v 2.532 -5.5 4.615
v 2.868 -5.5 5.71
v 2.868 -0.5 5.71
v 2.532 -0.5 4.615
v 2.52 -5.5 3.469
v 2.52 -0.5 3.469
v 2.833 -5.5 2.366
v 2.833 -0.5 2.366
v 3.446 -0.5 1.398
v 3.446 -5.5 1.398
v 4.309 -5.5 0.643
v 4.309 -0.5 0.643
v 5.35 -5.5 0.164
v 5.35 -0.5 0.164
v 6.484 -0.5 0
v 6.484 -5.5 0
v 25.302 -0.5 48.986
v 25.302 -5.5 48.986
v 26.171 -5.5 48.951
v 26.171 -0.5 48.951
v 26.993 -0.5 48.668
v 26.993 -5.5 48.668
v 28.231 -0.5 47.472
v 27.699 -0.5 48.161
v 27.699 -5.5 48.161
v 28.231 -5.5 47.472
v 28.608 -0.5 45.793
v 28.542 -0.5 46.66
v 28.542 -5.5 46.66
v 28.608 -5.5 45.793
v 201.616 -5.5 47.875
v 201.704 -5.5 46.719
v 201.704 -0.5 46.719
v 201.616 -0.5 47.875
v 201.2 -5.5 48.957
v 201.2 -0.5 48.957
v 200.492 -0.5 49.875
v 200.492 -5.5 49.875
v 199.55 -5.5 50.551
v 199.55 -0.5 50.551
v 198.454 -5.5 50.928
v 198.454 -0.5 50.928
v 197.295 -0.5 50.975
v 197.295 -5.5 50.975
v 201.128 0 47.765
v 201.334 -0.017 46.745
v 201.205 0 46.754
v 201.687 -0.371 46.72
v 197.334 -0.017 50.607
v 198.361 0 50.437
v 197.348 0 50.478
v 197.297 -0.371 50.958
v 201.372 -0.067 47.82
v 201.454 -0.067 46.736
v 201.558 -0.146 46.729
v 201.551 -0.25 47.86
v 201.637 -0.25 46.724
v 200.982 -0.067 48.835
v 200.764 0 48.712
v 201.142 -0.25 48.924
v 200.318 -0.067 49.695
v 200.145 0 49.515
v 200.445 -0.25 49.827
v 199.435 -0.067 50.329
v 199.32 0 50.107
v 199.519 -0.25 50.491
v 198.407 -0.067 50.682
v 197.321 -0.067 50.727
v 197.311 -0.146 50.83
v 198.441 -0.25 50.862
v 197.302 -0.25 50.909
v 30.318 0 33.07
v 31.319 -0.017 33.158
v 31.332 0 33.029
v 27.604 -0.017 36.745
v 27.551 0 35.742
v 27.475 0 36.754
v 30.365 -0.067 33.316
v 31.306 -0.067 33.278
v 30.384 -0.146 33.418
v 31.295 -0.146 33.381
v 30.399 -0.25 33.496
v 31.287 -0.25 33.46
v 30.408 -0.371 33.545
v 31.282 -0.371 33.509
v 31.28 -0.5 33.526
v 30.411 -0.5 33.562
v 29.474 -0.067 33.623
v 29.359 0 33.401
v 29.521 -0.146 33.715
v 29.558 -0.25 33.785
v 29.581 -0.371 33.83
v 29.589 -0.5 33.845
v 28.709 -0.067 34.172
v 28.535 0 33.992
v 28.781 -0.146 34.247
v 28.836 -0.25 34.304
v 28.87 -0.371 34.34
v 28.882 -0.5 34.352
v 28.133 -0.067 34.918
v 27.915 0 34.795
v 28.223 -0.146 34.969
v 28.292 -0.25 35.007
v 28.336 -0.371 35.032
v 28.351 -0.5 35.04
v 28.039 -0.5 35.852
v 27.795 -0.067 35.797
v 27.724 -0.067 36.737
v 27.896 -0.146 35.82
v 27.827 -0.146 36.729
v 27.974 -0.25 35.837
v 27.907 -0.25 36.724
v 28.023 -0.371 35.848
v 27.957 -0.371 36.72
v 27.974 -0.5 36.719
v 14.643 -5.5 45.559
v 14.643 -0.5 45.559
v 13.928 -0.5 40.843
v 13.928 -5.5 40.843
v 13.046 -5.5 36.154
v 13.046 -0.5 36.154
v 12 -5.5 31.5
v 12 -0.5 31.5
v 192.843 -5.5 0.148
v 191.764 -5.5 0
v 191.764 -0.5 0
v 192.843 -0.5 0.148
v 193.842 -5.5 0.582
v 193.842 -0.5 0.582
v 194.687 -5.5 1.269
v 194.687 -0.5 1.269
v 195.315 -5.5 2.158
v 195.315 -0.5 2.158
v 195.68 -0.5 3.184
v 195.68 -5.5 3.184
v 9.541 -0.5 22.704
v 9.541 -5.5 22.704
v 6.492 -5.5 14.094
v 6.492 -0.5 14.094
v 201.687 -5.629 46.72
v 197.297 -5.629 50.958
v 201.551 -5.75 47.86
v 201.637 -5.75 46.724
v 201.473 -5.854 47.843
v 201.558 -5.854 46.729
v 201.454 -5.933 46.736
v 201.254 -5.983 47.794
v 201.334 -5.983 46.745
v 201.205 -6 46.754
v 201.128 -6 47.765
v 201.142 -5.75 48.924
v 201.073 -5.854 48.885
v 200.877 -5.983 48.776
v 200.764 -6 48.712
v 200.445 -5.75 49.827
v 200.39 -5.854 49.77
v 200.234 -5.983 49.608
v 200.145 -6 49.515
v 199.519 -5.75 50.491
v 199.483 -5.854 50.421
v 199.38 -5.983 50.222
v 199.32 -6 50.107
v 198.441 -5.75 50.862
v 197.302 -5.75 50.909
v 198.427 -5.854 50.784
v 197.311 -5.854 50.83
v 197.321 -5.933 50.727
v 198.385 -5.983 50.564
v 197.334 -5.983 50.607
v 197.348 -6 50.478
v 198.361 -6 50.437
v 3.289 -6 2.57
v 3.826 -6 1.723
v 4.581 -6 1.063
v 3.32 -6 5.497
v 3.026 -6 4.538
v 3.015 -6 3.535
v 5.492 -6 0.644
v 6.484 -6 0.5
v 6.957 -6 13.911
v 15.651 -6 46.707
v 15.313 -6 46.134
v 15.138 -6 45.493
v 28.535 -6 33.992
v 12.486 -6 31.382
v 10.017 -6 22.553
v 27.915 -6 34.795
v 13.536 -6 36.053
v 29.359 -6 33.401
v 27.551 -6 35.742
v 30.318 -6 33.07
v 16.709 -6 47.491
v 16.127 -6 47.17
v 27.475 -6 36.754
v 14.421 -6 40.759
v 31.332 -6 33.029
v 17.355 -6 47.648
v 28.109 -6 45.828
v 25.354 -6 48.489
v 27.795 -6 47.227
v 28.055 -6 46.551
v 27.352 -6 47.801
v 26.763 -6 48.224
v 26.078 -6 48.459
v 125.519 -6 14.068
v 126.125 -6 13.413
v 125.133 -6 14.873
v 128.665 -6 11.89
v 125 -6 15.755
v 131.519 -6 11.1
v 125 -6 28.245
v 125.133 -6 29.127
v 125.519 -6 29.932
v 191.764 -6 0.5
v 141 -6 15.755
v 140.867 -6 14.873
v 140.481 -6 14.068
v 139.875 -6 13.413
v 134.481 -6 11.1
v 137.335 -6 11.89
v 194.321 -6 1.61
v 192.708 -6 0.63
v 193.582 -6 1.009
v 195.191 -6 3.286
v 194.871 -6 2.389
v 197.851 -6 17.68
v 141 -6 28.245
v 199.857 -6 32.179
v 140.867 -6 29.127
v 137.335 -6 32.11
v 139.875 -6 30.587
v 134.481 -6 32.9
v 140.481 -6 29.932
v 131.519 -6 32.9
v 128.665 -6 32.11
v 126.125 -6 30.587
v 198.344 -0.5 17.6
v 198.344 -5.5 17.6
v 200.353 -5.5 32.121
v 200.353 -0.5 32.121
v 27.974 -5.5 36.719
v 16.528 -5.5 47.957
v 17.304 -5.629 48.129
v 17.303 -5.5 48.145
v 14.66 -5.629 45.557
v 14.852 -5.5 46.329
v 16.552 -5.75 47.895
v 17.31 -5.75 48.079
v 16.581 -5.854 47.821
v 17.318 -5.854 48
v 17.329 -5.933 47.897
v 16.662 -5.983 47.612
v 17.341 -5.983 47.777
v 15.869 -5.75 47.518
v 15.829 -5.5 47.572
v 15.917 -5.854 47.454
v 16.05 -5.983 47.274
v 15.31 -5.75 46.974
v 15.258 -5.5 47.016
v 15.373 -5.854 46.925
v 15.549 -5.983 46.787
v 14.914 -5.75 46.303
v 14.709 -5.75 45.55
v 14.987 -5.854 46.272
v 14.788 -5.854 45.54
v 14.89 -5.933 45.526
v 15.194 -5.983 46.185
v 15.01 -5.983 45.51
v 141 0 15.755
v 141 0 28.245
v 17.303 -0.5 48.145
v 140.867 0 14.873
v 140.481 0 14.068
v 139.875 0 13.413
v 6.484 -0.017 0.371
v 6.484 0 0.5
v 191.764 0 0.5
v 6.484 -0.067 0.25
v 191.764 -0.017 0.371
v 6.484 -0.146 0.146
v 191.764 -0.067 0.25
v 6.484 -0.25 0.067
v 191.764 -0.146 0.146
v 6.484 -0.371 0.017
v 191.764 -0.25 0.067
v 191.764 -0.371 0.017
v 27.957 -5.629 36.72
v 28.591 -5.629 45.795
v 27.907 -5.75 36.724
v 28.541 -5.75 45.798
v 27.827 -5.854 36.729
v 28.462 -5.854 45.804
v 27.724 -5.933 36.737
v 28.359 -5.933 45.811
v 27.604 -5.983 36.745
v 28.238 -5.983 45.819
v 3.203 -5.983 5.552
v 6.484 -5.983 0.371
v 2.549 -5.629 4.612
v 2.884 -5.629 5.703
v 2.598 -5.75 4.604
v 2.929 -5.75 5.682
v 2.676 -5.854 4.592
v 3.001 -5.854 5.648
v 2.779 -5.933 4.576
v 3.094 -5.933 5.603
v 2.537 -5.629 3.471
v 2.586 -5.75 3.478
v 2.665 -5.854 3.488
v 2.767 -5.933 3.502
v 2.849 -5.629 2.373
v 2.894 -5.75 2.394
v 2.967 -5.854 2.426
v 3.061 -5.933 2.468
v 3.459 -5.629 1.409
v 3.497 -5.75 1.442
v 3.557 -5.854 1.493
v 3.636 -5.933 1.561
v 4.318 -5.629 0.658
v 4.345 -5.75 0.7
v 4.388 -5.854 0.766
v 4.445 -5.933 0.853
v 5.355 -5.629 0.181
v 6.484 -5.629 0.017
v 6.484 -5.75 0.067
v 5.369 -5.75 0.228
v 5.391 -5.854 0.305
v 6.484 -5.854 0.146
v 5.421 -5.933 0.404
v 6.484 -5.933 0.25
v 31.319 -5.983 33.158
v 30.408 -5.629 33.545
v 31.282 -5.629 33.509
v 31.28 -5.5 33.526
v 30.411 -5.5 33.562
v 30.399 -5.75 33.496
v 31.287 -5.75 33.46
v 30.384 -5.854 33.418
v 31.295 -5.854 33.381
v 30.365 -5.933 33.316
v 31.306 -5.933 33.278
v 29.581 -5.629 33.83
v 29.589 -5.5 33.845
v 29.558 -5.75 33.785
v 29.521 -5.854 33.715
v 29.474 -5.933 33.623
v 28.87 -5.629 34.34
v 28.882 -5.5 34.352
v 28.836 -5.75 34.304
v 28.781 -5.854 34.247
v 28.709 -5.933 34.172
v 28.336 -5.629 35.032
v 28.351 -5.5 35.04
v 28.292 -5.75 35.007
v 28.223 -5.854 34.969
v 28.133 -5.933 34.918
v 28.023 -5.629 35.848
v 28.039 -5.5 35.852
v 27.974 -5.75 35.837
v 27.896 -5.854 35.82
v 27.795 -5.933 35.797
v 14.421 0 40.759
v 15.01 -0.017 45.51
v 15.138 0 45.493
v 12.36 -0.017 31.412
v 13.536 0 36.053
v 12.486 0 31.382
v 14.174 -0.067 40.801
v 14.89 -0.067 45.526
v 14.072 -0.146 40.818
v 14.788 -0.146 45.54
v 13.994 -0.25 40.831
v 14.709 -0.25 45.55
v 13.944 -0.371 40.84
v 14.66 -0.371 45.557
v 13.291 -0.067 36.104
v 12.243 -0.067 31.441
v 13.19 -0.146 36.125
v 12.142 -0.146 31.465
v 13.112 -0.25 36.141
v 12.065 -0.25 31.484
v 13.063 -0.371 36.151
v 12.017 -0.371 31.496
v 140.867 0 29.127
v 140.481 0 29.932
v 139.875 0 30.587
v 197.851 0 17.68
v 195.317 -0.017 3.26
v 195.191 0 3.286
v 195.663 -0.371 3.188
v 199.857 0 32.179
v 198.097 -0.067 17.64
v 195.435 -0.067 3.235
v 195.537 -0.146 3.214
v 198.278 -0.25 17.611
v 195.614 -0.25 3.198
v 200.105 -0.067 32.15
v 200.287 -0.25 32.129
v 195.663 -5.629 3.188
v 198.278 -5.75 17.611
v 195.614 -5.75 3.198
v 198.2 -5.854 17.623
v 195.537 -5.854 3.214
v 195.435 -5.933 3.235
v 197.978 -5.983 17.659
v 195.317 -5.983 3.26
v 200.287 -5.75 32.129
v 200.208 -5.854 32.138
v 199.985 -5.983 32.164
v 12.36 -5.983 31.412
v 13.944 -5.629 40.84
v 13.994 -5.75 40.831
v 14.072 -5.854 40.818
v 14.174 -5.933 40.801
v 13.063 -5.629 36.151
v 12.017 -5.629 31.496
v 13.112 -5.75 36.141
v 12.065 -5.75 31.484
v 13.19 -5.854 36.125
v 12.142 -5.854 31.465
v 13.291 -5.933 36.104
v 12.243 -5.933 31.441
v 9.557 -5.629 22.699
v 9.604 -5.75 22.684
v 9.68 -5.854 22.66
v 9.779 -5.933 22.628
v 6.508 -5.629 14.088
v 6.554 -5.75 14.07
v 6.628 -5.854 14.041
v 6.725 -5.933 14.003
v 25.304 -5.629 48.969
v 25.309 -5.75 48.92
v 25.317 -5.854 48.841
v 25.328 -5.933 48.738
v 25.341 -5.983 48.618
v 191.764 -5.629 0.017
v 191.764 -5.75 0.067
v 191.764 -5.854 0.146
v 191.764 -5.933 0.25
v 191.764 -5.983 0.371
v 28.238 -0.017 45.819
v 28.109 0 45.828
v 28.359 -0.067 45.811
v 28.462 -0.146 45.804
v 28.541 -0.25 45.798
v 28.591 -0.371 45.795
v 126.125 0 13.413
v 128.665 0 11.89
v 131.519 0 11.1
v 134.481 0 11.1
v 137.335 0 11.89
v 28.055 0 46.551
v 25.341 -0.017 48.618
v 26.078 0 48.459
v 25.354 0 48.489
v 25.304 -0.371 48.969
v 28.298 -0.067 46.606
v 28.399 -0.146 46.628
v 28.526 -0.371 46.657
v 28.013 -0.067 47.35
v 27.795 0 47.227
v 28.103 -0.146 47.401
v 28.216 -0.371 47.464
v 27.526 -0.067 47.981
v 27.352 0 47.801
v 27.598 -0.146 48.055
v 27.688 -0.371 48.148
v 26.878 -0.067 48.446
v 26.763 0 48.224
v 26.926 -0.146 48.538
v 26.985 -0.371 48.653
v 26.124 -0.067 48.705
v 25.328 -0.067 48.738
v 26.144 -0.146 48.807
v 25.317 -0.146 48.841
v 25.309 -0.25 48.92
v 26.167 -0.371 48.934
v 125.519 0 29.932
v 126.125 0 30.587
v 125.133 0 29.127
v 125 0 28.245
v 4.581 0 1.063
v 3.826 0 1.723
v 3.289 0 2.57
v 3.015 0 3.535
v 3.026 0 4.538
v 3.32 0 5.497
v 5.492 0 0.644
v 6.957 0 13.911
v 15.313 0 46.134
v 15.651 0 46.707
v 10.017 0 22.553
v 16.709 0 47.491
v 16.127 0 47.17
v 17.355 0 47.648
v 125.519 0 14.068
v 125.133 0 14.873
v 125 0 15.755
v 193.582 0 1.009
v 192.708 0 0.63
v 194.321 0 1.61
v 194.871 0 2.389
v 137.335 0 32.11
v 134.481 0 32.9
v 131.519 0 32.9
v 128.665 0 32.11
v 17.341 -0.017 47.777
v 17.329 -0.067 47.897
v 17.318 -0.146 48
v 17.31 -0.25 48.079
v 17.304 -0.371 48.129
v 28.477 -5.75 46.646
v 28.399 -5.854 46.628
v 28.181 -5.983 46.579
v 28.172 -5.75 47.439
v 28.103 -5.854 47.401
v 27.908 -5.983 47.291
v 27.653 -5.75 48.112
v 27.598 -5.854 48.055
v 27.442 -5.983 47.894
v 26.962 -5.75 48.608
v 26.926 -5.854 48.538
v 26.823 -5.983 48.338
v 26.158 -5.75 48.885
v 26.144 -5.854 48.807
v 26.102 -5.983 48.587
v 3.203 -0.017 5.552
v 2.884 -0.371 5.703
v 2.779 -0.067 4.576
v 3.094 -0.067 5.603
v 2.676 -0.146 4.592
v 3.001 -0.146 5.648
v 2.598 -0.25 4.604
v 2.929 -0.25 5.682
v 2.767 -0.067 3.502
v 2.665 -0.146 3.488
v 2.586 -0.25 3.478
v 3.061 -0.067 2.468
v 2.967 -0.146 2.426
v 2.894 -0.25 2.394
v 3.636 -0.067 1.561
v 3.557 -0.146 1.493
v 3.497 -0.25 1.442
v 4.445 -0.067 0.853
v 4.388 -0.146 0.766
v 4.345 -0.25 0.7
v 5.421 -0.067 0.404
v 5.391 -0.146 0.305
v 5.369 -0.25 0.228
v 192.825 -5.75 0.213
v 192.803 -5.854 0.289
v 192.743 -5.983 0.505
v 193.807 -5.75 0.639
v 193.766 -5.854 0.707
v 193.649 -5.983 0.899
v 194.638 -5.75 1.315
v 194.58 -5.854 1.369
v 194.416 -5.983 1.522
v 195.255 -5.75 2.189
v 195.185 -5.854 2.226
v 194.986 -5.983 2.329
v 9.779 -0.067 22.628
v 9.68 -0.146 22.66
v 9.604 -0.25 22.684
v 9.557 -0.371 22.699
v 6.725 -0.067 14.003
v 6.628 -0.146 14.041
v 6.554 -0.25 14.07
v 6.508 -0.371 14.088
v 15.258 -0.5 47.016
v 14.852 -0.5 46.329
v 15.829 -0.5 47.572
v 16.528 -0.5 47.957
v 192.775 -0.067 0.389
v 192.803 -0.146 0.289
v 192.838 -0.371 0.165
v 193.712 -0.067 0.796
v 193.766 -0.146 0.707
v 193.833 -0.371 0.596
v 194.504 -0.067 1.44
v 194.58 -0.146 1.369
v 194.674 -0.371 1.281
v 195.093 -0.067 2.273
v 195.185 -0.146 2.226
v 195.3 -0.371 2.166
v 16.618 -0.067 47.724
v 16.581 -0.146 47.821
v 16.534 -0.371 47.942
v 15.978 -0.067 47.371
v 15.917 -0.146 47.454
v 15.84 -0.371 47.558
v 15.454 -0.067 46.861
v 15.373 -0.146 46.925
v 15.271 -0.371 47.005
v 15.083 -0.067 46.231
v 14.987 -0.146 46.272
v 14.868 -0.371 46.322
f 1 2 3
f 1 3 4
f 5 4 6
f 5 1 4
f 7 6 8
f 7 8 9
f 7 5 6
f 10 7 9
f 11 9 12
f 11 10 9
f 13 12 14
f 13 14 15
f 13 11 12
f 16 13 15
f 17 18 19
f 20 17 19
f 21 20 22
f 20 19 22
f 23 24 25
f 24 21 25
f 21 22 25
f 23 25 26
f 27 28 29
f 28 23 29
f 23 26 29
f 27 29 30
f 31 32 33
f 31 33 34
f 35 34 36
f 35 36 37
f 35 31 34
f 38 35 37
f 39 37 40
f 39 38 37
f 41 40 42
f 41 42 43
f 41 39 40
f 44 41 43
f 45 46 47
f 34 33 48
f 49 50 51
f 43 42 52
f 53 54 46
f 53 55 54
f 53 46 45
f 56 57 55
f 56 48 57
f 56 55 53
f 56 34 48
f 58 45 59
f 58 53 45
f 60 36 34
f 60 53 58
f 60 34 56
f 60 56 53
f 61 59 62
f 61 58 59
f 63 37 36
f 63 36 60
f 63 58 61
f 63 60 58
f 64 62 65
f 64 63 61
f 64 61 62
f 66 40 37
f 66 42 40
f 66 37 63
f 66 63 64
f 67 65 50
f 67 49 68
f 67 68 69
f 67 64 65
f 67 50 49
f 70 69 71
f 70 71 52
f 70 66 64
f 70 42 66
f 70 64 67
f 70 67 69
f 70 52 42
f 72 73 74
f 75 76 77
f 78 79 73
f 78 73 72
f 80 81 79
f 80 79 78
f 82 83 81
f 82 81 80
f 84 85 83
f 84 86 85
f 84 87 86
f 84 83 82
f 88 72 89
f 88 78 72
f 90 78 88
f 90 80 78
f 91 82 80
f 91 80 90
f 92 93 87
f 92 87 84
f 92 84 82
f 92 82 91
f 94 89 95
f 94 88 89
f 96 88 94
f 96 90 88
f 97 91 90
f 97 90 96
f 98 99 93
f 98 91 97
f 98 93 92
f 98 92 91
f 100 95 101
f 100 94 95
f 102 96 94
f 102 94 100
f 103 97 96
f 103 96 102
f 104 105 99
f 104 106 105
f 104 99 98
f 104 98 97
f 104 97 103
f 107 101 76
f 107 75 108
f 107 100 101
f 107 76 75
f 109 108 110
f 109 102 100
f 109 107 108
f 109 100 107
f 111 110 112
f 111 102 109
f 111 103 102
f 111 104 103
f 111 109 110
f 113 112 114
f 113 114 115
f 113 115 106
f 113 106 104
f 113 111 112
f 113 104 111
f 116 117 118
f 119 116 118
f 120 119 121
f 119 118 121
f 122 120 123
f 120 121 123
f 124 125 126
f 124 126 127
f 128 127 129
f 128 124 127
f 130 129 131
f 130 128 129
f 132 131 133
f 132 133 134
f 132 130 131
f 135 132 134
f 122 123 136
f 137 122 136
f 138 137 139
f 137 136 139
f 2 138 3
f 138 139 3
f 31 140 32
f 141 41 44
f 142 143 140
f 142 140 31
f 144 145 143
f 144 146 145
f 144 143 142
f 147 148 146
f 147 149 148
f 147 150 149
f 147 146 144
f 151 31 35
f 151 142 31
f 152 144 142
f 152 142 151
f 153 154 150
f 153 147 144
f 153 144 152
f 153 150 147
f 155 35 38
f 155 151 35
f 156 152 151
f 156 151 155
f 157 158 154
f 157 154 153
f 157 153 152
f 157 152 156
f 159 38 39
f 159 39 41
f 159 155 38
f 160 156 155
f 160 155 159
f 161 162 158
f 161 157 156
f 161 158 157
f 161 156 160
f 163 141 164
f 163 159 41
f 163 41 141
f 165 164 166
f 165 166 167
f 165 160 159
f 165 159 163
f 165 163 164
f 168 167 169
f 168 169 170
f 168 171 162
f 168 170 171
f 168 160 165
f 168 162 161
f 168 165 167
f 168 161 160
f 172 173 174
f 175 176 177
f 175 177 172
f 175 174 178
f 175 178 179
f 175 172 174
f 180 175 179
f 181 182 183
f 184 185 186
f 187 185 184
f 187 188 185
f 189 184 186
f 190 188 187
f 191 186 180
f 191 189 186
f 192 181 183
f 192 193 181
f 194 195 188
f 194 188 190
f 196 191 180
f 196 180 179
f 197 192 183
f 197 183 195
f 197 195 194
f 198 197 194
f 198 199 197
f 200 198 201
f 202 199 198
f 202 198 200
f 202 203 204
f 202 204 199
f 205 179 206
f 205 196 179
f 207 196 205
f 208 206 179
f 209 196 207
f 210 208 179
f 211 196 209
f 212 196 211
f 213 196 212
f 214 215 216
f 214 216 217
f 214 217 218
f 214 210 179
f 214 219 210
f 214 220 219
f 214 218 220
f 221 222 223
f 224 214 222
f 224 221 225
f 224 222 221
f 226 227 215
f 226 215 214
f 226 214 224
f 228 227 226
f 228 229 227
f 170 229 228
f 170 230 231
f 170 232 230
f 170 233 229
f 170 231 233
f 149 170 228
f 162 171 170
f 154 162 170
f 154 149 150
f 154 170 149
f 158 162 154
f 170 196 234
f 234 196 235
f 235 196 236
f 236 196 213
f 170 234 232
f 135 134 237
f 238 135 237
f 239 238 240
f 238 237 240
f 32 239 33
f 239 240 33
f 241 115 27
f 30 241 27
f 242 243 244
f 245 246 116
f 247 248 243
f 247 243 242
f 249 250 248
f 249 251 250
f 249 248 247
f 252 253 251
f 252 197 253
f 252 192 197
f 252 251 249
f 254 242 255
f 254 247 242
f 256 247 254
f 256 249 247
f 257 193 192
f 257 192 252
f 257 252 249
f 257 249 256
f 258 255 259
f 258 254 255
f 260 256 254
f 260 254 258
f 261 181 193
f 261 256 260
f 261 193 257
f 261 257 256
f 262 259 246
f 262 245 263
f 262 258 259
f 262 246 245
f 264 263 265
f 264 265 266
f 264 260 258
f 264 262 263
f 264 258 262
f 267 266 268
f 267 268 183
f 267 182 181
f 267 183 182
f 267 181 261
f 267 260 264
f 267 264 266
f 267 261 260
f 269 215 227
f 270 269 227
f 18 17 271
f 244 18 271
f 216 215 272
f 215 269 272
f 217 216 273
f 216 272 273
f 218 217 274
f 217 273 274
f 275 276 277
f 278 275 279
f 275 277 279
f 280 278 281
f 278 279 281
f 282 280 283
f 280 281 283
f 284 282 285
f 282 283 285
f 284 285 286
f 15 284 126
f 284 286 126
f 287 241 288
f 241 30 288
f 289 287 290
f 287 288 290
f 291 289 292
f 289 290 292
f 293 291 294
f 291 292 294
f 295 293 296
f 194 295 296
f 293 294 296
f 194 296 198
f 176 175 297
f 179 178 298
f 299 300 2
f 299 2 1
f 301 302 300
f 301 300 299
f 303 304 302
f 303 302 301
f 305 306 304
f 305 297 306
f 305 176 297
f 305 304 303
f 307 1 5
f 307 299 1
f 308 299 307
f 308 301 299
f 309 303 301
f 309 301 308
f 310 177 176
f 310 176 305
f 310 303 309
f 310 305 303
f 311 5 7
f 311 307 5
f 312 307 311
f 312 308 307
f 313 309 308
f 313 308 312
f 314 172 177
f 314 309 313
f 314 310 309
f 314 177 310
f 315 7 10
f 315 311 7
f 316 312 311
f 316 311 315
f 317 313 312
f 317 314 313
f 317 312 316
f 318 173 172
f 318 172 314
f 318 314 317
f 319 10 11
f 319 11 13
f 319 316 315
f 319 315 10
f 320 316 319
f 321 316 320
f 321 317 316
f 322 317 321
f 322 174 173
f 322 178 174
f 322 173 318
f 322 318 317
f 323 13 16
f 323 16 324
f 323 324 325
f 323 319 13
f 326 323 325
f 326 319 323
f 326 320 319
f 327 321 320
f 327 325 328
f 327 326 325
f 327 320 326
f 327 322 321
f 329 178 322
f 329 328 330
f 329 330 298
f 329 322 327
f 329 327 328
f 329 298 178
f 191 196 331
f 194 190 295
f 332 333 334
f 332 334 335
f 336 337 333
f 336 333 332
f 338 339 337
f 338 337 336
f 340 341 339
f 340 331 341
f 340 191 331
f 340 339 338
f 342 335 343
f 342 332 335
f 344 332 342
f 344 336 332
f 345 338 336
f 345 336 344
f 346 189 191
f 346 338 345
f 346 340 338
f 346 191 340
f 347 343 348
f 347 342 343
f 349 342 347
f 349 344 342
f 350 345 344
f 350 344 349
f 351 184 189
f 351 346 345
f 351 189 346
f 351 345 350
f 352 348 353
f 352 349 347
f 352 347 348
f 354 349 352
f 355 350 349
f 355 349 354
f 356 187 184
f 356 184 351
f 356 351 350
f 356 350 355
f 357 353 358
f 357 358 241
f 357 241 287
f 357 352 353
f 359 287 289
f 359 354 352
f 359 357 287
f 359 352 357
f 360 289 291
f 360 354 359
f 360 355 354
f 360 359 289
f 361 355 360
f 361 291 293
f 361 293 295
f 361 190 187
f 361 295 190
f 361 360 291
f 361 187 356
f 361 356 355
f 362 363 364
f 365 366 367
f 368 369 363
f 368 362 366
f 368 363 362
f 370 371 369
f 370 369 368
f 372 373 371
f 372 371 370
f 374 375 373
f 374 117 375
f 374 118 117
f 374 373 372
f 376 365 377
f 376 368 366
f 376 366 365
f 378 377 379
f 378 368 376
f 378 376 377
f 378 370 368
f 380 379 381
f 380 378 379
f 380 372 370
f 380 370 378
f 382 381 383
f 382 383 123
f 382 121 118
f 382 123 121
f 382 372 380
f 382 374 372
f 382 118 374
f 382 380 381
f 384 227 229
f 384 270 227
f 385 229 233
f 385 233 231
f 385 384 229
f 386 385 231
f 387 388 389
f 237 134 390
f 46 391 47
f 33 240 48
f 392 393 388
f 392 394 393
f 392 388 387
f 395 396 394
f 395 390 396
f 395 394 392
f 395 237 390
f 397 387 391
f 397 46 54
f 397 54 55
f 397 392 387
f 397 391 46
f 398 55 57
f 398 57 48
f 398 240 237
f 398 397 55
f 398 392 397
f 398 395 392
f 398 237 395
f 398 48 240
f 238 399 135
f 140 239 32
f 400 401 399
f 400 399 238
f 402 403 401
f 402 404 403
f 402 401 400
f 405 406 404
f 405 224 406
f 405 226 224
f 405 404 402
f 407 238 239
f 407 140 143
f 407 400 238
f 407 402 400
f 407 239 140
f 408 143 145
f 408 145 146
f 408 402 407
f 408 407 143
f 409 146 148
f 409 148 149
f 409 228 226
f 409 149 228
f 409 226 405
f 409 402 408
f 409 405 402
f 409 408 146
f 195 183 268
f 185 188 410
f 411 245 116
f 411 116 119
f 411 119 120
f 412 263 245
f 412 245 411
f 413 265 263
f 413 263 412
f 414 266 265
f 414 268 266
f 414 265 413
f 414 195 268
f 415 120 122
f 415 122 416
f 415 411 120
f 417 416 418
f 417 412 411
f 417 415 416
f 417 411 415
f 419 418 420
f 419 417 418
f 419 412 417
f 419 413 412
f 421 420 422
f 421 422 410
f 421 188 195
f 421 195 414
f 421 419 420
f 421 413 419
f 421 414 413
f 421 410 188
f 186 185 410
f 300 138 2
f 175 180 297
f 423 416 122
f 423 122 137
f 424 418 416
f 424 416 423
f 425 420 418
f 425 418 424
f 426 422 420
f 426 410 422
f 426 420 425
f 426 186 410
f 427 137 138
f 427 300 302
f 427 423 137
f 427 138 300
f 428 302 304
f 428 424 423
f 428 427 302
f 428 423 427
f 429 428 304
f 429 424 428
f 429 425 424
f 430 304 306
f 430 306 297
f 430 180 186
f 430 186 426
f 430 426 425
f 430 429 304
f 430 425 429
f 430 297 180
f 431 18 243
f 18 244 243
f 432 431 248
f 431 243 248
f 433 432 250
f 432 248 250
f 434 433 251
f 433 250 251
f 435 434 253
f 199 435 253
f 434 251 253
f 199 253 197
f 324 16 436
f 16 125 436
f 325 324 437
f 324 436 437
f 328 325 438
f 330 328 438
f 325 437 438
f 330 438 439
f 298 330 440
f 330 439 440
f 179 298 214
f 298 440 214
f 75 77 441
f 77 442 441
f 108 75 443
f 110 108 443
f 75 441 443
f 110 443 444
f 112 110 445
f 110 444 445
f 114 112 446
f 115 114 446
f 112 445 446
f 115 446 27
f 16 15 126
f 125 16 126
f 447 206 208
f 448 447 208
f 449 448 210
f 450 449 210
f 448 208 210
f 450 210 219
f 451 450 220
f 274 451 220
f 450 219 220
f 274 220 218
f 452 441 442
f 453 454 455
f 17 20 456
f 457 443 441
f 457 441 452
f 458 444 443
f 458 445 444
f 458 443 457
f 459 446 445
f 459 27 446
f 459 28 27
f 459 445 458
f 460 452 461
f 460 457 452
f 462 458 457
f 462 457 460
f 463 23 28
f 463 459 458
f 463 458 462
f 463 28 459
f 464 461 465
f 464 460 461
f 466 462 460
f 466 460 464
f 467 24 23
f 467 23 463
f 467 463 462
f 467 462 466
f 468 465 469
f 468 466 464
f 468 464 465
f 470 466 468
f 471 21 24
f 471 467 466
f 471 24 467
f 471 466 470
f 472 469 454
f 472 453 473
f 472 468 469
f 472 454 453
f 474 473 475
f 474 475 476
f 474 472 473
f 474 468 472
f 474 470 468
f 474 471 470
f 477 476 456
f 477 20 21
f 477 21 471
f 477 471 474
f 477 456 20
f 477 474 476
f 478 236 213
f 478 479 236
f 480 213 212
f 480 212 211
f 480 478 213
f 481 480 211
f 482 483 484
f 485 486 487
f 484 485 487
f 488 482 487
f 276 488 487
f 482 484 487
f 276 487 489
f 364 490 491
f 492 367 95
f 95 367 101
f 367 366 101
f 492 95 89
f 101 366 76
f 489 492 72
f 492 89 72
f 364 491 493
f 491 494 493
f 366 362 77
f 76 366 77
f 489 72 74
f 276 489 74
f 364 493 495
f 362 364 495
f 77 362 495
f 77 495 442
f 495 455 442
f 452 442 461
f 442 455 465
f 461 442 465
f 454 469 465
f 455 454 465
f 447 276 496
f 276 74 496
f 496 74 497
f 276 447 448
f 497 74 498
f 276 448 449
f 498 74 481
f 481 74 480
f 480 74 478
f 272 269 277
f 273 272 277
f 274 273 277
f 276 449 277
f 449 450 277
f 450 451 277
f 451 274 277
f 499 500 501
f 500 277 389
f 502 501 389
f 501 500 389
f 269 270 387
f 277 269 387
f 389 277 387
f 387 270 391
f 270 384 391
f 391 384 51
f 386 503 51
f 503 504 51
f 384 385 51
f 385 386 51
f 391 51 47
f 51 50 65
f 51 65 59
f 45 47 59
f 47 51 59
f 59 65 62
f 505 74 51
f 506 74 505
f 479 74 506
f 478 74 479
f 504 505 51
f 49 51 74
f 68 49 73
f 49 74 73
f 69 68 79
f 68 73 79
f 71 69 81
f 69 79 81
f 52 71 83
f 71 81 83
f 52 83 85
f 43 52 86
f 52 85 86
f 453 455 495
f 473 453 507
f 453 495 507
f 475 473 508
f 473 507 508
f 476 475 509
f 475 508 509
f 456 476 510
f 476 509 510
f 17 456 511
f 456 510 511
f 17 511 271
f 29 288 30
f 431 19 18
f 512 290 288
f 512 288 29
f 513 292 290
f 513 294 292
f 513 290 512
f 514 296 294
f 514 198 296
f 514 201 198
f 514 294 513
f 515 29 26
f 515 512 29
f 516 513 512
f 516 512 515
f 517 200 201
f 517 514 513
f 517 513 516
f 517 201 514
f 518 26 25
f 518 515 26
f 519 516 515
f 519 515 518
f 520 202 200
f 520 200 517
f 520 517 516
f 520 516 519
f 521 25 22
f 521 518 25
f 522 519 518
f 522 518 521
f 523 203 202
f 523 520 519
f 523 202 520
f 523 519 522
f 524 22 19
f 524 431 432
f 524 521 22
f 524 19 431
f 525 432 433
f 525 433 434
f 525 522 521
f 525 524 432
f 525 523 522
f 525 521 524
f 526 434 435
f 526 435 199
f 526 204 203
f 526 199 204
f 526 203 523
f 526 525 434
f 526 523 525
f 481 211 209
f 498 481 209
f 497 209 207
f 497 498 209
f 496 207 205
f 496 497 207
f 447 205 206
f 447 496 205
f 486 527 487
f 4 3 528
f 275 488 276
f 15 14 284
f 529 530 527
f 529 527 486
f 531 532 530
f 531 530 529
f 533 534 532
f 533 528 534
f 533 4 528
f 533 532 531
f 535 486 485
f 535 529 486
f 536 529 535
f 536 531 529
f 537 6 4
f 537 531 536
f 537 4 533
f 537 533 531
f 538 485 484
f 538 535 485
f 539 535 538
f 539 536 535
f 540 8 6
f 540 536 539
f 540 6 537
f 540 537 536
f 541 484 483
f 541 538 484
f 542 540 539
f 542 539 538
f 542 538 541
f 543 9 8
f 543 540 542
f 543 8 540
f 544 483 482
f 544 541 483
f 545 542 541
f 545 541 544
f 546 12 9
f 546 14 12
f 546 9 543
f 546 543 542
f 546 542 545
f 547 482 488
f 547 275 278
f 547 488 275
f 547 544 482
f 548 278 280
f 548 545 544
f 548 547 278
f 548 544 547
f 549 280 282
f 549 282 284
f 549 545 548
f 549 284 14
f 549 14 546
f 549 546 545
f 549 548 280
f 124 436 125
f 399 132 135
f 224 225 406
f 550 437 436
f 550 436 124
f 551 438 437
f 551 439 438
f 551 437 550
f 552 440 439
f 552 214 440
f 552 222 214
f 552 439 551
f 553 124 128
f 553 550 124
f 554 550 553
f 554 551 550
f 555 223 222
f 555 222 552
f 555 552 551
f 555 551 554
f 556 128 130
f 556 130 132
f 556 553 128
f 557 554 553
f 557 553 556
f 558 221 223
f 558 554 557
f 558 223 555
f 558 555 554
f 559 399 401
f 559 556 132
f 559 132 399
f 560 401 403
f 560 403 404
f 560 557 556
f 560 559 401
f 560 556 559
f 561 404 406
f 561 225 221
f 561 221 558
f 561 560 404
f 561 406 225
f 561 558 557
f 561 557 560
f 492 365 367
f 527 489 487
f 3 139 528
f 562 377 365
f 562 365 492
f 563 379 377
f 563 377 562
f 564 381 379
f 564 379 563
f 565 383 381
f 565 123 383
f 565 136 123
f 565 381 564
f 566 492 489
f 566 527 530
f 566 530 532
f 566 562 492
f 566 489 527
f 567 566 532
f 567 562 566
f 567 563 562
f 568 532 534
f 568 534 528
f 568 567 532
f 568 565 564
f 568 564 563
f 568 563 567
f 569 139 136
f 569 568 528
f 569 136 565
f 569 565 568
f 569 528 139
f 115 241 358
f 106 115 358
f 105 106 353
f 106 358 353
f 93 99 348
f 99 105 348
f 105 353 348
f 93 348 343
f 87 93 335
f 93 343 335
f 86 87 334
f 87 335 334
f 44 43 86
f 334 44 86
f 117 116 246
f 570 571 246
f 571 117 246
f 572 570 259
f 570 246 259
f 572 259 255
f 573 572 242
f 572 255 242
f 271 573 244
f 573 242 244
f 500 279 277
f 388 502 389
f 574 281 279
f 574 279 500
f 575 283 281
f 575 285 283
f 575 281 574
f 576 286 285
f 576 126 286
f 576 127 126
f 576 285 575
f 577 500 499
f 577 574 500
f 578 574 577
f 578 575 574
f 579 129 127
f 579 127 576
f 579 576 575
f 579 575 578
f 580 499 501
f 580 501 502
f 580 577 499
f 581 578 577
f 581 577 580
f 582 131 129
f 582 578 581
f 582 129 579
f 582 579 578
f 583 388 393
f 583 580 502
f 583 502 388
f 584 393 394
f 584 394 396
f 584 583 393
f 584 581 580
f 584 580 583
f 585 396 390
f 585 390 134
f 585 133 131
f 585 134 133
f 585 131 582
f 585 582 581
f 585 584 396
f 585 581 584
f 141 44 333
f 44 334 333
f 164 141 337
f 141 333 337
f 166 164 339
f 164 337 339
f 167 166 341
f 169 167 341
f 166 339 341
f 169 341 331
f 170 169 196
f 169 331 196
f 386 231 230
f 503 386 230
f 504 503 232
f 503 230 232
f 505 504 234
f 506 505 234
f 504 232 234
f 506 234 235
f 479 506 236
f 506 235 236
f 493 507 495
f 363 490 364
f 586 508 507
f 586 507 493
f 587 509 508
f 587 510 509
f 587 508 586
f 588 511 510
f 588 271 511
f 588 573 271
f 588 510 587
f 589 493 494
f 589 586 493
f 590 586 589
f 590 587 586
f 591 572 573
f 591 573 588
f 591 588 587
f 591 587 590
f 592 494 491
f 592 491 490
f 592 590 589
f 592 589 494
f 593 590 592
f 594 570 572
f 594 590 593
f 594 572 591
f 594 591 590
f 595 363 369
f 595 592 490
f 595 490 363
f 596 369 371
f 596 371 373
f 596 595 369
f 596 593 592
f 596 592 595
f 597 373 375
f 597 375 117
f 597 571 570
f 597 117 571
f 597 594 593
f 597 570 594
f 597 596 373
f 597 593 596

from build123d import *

# Parameters (mm, degrees)
F1_DEPTH = 6
F2_R     = 4
F4_DEPTH = 6
F6_DEPTH = 6.001
F7_R     = 3
F8_R     = 0.5


with BuildPart() as f1:
    # F0 (on Front) → F1 (new body)
    with BuildSketch(Plane.XZ):
        with BuildLine():
            ThreePointArc((12, 31.5), (6.98702, 15.373992), (0, 0))
            Line((0, 0), (195, 0))
            ThreePointArc((195, 0), (199.533116, 25.594396), (202, 51.469805))
            Line((202, 51.469805), (12, 31.5))
        make_face()
    extrude(amount=F1_DEPTH)

    # F2
    f2_edges = [f1.edges().sort_by_distance(p)[0] for p in [
        (0, -3, 0),
        (195, -3, 0),
        (202, -3, 51.469805),
    ]]
    fillet(f2_edges, radius=F2_R)

    # F3 (on Front) → F4 (join)
    with BuildSketch(Plane.XZ):
        with BuildLine():
            ThreePointArc((14.934146, 47.896524), (13.7202, 39.652965), (12, 31.5))
            Line((12, 31.5), (27.724132, 33.152673))
            Line((27.724132, 33.152673), (28.857453, 49.359922))
            Line((28.857453, 49.359922), (14.934146, 47.896524))
        make_face()
    extrude(amount=F4_DEPTH)

    # F5 (on face) → F6 (cut, through all)
    with BuildSketch(Plane.XZ.offset(6)):
        with BuildLine():
            Line((141, 14.450166), (141, 29.549834))
            ThreePointArc((141, 29.549834), (133, 33), (125, 29.549834))
            Line((125, 29.549834), (125, 14.450166))
            ThreePointArc((125, 14.450166), (133, 11), (141, 14.450166))
        make_face()
    extrude(amount=-F6_DEPTH, mode=Mode.SUBTRACT)

    # F7
    f7_edges = [f1.edges().sort_by_distance(p)[0] for p in [
        (14.934146, -3, 47.896524),
        (28.857453, -3, 49.359922),
        (27.724132, -3, 33.152673),
        (125, -3, 14.450166),
        (125, -3, 29.549834),
        (141, -3, 29.549834),
        (141, -3, 14.450166),
    ]]
    fillet(f7_edges, radius=F7_R)

    # F8
    f8_edges = [f1.edges().sort_by_distance(p)[0] for p in [
        (10.297784, -6, 25.178986),
        (10.297784, 0, 25.178986),
    ]]
    fillet(f8_edges, radius=F8_R)


solid = f1.part
